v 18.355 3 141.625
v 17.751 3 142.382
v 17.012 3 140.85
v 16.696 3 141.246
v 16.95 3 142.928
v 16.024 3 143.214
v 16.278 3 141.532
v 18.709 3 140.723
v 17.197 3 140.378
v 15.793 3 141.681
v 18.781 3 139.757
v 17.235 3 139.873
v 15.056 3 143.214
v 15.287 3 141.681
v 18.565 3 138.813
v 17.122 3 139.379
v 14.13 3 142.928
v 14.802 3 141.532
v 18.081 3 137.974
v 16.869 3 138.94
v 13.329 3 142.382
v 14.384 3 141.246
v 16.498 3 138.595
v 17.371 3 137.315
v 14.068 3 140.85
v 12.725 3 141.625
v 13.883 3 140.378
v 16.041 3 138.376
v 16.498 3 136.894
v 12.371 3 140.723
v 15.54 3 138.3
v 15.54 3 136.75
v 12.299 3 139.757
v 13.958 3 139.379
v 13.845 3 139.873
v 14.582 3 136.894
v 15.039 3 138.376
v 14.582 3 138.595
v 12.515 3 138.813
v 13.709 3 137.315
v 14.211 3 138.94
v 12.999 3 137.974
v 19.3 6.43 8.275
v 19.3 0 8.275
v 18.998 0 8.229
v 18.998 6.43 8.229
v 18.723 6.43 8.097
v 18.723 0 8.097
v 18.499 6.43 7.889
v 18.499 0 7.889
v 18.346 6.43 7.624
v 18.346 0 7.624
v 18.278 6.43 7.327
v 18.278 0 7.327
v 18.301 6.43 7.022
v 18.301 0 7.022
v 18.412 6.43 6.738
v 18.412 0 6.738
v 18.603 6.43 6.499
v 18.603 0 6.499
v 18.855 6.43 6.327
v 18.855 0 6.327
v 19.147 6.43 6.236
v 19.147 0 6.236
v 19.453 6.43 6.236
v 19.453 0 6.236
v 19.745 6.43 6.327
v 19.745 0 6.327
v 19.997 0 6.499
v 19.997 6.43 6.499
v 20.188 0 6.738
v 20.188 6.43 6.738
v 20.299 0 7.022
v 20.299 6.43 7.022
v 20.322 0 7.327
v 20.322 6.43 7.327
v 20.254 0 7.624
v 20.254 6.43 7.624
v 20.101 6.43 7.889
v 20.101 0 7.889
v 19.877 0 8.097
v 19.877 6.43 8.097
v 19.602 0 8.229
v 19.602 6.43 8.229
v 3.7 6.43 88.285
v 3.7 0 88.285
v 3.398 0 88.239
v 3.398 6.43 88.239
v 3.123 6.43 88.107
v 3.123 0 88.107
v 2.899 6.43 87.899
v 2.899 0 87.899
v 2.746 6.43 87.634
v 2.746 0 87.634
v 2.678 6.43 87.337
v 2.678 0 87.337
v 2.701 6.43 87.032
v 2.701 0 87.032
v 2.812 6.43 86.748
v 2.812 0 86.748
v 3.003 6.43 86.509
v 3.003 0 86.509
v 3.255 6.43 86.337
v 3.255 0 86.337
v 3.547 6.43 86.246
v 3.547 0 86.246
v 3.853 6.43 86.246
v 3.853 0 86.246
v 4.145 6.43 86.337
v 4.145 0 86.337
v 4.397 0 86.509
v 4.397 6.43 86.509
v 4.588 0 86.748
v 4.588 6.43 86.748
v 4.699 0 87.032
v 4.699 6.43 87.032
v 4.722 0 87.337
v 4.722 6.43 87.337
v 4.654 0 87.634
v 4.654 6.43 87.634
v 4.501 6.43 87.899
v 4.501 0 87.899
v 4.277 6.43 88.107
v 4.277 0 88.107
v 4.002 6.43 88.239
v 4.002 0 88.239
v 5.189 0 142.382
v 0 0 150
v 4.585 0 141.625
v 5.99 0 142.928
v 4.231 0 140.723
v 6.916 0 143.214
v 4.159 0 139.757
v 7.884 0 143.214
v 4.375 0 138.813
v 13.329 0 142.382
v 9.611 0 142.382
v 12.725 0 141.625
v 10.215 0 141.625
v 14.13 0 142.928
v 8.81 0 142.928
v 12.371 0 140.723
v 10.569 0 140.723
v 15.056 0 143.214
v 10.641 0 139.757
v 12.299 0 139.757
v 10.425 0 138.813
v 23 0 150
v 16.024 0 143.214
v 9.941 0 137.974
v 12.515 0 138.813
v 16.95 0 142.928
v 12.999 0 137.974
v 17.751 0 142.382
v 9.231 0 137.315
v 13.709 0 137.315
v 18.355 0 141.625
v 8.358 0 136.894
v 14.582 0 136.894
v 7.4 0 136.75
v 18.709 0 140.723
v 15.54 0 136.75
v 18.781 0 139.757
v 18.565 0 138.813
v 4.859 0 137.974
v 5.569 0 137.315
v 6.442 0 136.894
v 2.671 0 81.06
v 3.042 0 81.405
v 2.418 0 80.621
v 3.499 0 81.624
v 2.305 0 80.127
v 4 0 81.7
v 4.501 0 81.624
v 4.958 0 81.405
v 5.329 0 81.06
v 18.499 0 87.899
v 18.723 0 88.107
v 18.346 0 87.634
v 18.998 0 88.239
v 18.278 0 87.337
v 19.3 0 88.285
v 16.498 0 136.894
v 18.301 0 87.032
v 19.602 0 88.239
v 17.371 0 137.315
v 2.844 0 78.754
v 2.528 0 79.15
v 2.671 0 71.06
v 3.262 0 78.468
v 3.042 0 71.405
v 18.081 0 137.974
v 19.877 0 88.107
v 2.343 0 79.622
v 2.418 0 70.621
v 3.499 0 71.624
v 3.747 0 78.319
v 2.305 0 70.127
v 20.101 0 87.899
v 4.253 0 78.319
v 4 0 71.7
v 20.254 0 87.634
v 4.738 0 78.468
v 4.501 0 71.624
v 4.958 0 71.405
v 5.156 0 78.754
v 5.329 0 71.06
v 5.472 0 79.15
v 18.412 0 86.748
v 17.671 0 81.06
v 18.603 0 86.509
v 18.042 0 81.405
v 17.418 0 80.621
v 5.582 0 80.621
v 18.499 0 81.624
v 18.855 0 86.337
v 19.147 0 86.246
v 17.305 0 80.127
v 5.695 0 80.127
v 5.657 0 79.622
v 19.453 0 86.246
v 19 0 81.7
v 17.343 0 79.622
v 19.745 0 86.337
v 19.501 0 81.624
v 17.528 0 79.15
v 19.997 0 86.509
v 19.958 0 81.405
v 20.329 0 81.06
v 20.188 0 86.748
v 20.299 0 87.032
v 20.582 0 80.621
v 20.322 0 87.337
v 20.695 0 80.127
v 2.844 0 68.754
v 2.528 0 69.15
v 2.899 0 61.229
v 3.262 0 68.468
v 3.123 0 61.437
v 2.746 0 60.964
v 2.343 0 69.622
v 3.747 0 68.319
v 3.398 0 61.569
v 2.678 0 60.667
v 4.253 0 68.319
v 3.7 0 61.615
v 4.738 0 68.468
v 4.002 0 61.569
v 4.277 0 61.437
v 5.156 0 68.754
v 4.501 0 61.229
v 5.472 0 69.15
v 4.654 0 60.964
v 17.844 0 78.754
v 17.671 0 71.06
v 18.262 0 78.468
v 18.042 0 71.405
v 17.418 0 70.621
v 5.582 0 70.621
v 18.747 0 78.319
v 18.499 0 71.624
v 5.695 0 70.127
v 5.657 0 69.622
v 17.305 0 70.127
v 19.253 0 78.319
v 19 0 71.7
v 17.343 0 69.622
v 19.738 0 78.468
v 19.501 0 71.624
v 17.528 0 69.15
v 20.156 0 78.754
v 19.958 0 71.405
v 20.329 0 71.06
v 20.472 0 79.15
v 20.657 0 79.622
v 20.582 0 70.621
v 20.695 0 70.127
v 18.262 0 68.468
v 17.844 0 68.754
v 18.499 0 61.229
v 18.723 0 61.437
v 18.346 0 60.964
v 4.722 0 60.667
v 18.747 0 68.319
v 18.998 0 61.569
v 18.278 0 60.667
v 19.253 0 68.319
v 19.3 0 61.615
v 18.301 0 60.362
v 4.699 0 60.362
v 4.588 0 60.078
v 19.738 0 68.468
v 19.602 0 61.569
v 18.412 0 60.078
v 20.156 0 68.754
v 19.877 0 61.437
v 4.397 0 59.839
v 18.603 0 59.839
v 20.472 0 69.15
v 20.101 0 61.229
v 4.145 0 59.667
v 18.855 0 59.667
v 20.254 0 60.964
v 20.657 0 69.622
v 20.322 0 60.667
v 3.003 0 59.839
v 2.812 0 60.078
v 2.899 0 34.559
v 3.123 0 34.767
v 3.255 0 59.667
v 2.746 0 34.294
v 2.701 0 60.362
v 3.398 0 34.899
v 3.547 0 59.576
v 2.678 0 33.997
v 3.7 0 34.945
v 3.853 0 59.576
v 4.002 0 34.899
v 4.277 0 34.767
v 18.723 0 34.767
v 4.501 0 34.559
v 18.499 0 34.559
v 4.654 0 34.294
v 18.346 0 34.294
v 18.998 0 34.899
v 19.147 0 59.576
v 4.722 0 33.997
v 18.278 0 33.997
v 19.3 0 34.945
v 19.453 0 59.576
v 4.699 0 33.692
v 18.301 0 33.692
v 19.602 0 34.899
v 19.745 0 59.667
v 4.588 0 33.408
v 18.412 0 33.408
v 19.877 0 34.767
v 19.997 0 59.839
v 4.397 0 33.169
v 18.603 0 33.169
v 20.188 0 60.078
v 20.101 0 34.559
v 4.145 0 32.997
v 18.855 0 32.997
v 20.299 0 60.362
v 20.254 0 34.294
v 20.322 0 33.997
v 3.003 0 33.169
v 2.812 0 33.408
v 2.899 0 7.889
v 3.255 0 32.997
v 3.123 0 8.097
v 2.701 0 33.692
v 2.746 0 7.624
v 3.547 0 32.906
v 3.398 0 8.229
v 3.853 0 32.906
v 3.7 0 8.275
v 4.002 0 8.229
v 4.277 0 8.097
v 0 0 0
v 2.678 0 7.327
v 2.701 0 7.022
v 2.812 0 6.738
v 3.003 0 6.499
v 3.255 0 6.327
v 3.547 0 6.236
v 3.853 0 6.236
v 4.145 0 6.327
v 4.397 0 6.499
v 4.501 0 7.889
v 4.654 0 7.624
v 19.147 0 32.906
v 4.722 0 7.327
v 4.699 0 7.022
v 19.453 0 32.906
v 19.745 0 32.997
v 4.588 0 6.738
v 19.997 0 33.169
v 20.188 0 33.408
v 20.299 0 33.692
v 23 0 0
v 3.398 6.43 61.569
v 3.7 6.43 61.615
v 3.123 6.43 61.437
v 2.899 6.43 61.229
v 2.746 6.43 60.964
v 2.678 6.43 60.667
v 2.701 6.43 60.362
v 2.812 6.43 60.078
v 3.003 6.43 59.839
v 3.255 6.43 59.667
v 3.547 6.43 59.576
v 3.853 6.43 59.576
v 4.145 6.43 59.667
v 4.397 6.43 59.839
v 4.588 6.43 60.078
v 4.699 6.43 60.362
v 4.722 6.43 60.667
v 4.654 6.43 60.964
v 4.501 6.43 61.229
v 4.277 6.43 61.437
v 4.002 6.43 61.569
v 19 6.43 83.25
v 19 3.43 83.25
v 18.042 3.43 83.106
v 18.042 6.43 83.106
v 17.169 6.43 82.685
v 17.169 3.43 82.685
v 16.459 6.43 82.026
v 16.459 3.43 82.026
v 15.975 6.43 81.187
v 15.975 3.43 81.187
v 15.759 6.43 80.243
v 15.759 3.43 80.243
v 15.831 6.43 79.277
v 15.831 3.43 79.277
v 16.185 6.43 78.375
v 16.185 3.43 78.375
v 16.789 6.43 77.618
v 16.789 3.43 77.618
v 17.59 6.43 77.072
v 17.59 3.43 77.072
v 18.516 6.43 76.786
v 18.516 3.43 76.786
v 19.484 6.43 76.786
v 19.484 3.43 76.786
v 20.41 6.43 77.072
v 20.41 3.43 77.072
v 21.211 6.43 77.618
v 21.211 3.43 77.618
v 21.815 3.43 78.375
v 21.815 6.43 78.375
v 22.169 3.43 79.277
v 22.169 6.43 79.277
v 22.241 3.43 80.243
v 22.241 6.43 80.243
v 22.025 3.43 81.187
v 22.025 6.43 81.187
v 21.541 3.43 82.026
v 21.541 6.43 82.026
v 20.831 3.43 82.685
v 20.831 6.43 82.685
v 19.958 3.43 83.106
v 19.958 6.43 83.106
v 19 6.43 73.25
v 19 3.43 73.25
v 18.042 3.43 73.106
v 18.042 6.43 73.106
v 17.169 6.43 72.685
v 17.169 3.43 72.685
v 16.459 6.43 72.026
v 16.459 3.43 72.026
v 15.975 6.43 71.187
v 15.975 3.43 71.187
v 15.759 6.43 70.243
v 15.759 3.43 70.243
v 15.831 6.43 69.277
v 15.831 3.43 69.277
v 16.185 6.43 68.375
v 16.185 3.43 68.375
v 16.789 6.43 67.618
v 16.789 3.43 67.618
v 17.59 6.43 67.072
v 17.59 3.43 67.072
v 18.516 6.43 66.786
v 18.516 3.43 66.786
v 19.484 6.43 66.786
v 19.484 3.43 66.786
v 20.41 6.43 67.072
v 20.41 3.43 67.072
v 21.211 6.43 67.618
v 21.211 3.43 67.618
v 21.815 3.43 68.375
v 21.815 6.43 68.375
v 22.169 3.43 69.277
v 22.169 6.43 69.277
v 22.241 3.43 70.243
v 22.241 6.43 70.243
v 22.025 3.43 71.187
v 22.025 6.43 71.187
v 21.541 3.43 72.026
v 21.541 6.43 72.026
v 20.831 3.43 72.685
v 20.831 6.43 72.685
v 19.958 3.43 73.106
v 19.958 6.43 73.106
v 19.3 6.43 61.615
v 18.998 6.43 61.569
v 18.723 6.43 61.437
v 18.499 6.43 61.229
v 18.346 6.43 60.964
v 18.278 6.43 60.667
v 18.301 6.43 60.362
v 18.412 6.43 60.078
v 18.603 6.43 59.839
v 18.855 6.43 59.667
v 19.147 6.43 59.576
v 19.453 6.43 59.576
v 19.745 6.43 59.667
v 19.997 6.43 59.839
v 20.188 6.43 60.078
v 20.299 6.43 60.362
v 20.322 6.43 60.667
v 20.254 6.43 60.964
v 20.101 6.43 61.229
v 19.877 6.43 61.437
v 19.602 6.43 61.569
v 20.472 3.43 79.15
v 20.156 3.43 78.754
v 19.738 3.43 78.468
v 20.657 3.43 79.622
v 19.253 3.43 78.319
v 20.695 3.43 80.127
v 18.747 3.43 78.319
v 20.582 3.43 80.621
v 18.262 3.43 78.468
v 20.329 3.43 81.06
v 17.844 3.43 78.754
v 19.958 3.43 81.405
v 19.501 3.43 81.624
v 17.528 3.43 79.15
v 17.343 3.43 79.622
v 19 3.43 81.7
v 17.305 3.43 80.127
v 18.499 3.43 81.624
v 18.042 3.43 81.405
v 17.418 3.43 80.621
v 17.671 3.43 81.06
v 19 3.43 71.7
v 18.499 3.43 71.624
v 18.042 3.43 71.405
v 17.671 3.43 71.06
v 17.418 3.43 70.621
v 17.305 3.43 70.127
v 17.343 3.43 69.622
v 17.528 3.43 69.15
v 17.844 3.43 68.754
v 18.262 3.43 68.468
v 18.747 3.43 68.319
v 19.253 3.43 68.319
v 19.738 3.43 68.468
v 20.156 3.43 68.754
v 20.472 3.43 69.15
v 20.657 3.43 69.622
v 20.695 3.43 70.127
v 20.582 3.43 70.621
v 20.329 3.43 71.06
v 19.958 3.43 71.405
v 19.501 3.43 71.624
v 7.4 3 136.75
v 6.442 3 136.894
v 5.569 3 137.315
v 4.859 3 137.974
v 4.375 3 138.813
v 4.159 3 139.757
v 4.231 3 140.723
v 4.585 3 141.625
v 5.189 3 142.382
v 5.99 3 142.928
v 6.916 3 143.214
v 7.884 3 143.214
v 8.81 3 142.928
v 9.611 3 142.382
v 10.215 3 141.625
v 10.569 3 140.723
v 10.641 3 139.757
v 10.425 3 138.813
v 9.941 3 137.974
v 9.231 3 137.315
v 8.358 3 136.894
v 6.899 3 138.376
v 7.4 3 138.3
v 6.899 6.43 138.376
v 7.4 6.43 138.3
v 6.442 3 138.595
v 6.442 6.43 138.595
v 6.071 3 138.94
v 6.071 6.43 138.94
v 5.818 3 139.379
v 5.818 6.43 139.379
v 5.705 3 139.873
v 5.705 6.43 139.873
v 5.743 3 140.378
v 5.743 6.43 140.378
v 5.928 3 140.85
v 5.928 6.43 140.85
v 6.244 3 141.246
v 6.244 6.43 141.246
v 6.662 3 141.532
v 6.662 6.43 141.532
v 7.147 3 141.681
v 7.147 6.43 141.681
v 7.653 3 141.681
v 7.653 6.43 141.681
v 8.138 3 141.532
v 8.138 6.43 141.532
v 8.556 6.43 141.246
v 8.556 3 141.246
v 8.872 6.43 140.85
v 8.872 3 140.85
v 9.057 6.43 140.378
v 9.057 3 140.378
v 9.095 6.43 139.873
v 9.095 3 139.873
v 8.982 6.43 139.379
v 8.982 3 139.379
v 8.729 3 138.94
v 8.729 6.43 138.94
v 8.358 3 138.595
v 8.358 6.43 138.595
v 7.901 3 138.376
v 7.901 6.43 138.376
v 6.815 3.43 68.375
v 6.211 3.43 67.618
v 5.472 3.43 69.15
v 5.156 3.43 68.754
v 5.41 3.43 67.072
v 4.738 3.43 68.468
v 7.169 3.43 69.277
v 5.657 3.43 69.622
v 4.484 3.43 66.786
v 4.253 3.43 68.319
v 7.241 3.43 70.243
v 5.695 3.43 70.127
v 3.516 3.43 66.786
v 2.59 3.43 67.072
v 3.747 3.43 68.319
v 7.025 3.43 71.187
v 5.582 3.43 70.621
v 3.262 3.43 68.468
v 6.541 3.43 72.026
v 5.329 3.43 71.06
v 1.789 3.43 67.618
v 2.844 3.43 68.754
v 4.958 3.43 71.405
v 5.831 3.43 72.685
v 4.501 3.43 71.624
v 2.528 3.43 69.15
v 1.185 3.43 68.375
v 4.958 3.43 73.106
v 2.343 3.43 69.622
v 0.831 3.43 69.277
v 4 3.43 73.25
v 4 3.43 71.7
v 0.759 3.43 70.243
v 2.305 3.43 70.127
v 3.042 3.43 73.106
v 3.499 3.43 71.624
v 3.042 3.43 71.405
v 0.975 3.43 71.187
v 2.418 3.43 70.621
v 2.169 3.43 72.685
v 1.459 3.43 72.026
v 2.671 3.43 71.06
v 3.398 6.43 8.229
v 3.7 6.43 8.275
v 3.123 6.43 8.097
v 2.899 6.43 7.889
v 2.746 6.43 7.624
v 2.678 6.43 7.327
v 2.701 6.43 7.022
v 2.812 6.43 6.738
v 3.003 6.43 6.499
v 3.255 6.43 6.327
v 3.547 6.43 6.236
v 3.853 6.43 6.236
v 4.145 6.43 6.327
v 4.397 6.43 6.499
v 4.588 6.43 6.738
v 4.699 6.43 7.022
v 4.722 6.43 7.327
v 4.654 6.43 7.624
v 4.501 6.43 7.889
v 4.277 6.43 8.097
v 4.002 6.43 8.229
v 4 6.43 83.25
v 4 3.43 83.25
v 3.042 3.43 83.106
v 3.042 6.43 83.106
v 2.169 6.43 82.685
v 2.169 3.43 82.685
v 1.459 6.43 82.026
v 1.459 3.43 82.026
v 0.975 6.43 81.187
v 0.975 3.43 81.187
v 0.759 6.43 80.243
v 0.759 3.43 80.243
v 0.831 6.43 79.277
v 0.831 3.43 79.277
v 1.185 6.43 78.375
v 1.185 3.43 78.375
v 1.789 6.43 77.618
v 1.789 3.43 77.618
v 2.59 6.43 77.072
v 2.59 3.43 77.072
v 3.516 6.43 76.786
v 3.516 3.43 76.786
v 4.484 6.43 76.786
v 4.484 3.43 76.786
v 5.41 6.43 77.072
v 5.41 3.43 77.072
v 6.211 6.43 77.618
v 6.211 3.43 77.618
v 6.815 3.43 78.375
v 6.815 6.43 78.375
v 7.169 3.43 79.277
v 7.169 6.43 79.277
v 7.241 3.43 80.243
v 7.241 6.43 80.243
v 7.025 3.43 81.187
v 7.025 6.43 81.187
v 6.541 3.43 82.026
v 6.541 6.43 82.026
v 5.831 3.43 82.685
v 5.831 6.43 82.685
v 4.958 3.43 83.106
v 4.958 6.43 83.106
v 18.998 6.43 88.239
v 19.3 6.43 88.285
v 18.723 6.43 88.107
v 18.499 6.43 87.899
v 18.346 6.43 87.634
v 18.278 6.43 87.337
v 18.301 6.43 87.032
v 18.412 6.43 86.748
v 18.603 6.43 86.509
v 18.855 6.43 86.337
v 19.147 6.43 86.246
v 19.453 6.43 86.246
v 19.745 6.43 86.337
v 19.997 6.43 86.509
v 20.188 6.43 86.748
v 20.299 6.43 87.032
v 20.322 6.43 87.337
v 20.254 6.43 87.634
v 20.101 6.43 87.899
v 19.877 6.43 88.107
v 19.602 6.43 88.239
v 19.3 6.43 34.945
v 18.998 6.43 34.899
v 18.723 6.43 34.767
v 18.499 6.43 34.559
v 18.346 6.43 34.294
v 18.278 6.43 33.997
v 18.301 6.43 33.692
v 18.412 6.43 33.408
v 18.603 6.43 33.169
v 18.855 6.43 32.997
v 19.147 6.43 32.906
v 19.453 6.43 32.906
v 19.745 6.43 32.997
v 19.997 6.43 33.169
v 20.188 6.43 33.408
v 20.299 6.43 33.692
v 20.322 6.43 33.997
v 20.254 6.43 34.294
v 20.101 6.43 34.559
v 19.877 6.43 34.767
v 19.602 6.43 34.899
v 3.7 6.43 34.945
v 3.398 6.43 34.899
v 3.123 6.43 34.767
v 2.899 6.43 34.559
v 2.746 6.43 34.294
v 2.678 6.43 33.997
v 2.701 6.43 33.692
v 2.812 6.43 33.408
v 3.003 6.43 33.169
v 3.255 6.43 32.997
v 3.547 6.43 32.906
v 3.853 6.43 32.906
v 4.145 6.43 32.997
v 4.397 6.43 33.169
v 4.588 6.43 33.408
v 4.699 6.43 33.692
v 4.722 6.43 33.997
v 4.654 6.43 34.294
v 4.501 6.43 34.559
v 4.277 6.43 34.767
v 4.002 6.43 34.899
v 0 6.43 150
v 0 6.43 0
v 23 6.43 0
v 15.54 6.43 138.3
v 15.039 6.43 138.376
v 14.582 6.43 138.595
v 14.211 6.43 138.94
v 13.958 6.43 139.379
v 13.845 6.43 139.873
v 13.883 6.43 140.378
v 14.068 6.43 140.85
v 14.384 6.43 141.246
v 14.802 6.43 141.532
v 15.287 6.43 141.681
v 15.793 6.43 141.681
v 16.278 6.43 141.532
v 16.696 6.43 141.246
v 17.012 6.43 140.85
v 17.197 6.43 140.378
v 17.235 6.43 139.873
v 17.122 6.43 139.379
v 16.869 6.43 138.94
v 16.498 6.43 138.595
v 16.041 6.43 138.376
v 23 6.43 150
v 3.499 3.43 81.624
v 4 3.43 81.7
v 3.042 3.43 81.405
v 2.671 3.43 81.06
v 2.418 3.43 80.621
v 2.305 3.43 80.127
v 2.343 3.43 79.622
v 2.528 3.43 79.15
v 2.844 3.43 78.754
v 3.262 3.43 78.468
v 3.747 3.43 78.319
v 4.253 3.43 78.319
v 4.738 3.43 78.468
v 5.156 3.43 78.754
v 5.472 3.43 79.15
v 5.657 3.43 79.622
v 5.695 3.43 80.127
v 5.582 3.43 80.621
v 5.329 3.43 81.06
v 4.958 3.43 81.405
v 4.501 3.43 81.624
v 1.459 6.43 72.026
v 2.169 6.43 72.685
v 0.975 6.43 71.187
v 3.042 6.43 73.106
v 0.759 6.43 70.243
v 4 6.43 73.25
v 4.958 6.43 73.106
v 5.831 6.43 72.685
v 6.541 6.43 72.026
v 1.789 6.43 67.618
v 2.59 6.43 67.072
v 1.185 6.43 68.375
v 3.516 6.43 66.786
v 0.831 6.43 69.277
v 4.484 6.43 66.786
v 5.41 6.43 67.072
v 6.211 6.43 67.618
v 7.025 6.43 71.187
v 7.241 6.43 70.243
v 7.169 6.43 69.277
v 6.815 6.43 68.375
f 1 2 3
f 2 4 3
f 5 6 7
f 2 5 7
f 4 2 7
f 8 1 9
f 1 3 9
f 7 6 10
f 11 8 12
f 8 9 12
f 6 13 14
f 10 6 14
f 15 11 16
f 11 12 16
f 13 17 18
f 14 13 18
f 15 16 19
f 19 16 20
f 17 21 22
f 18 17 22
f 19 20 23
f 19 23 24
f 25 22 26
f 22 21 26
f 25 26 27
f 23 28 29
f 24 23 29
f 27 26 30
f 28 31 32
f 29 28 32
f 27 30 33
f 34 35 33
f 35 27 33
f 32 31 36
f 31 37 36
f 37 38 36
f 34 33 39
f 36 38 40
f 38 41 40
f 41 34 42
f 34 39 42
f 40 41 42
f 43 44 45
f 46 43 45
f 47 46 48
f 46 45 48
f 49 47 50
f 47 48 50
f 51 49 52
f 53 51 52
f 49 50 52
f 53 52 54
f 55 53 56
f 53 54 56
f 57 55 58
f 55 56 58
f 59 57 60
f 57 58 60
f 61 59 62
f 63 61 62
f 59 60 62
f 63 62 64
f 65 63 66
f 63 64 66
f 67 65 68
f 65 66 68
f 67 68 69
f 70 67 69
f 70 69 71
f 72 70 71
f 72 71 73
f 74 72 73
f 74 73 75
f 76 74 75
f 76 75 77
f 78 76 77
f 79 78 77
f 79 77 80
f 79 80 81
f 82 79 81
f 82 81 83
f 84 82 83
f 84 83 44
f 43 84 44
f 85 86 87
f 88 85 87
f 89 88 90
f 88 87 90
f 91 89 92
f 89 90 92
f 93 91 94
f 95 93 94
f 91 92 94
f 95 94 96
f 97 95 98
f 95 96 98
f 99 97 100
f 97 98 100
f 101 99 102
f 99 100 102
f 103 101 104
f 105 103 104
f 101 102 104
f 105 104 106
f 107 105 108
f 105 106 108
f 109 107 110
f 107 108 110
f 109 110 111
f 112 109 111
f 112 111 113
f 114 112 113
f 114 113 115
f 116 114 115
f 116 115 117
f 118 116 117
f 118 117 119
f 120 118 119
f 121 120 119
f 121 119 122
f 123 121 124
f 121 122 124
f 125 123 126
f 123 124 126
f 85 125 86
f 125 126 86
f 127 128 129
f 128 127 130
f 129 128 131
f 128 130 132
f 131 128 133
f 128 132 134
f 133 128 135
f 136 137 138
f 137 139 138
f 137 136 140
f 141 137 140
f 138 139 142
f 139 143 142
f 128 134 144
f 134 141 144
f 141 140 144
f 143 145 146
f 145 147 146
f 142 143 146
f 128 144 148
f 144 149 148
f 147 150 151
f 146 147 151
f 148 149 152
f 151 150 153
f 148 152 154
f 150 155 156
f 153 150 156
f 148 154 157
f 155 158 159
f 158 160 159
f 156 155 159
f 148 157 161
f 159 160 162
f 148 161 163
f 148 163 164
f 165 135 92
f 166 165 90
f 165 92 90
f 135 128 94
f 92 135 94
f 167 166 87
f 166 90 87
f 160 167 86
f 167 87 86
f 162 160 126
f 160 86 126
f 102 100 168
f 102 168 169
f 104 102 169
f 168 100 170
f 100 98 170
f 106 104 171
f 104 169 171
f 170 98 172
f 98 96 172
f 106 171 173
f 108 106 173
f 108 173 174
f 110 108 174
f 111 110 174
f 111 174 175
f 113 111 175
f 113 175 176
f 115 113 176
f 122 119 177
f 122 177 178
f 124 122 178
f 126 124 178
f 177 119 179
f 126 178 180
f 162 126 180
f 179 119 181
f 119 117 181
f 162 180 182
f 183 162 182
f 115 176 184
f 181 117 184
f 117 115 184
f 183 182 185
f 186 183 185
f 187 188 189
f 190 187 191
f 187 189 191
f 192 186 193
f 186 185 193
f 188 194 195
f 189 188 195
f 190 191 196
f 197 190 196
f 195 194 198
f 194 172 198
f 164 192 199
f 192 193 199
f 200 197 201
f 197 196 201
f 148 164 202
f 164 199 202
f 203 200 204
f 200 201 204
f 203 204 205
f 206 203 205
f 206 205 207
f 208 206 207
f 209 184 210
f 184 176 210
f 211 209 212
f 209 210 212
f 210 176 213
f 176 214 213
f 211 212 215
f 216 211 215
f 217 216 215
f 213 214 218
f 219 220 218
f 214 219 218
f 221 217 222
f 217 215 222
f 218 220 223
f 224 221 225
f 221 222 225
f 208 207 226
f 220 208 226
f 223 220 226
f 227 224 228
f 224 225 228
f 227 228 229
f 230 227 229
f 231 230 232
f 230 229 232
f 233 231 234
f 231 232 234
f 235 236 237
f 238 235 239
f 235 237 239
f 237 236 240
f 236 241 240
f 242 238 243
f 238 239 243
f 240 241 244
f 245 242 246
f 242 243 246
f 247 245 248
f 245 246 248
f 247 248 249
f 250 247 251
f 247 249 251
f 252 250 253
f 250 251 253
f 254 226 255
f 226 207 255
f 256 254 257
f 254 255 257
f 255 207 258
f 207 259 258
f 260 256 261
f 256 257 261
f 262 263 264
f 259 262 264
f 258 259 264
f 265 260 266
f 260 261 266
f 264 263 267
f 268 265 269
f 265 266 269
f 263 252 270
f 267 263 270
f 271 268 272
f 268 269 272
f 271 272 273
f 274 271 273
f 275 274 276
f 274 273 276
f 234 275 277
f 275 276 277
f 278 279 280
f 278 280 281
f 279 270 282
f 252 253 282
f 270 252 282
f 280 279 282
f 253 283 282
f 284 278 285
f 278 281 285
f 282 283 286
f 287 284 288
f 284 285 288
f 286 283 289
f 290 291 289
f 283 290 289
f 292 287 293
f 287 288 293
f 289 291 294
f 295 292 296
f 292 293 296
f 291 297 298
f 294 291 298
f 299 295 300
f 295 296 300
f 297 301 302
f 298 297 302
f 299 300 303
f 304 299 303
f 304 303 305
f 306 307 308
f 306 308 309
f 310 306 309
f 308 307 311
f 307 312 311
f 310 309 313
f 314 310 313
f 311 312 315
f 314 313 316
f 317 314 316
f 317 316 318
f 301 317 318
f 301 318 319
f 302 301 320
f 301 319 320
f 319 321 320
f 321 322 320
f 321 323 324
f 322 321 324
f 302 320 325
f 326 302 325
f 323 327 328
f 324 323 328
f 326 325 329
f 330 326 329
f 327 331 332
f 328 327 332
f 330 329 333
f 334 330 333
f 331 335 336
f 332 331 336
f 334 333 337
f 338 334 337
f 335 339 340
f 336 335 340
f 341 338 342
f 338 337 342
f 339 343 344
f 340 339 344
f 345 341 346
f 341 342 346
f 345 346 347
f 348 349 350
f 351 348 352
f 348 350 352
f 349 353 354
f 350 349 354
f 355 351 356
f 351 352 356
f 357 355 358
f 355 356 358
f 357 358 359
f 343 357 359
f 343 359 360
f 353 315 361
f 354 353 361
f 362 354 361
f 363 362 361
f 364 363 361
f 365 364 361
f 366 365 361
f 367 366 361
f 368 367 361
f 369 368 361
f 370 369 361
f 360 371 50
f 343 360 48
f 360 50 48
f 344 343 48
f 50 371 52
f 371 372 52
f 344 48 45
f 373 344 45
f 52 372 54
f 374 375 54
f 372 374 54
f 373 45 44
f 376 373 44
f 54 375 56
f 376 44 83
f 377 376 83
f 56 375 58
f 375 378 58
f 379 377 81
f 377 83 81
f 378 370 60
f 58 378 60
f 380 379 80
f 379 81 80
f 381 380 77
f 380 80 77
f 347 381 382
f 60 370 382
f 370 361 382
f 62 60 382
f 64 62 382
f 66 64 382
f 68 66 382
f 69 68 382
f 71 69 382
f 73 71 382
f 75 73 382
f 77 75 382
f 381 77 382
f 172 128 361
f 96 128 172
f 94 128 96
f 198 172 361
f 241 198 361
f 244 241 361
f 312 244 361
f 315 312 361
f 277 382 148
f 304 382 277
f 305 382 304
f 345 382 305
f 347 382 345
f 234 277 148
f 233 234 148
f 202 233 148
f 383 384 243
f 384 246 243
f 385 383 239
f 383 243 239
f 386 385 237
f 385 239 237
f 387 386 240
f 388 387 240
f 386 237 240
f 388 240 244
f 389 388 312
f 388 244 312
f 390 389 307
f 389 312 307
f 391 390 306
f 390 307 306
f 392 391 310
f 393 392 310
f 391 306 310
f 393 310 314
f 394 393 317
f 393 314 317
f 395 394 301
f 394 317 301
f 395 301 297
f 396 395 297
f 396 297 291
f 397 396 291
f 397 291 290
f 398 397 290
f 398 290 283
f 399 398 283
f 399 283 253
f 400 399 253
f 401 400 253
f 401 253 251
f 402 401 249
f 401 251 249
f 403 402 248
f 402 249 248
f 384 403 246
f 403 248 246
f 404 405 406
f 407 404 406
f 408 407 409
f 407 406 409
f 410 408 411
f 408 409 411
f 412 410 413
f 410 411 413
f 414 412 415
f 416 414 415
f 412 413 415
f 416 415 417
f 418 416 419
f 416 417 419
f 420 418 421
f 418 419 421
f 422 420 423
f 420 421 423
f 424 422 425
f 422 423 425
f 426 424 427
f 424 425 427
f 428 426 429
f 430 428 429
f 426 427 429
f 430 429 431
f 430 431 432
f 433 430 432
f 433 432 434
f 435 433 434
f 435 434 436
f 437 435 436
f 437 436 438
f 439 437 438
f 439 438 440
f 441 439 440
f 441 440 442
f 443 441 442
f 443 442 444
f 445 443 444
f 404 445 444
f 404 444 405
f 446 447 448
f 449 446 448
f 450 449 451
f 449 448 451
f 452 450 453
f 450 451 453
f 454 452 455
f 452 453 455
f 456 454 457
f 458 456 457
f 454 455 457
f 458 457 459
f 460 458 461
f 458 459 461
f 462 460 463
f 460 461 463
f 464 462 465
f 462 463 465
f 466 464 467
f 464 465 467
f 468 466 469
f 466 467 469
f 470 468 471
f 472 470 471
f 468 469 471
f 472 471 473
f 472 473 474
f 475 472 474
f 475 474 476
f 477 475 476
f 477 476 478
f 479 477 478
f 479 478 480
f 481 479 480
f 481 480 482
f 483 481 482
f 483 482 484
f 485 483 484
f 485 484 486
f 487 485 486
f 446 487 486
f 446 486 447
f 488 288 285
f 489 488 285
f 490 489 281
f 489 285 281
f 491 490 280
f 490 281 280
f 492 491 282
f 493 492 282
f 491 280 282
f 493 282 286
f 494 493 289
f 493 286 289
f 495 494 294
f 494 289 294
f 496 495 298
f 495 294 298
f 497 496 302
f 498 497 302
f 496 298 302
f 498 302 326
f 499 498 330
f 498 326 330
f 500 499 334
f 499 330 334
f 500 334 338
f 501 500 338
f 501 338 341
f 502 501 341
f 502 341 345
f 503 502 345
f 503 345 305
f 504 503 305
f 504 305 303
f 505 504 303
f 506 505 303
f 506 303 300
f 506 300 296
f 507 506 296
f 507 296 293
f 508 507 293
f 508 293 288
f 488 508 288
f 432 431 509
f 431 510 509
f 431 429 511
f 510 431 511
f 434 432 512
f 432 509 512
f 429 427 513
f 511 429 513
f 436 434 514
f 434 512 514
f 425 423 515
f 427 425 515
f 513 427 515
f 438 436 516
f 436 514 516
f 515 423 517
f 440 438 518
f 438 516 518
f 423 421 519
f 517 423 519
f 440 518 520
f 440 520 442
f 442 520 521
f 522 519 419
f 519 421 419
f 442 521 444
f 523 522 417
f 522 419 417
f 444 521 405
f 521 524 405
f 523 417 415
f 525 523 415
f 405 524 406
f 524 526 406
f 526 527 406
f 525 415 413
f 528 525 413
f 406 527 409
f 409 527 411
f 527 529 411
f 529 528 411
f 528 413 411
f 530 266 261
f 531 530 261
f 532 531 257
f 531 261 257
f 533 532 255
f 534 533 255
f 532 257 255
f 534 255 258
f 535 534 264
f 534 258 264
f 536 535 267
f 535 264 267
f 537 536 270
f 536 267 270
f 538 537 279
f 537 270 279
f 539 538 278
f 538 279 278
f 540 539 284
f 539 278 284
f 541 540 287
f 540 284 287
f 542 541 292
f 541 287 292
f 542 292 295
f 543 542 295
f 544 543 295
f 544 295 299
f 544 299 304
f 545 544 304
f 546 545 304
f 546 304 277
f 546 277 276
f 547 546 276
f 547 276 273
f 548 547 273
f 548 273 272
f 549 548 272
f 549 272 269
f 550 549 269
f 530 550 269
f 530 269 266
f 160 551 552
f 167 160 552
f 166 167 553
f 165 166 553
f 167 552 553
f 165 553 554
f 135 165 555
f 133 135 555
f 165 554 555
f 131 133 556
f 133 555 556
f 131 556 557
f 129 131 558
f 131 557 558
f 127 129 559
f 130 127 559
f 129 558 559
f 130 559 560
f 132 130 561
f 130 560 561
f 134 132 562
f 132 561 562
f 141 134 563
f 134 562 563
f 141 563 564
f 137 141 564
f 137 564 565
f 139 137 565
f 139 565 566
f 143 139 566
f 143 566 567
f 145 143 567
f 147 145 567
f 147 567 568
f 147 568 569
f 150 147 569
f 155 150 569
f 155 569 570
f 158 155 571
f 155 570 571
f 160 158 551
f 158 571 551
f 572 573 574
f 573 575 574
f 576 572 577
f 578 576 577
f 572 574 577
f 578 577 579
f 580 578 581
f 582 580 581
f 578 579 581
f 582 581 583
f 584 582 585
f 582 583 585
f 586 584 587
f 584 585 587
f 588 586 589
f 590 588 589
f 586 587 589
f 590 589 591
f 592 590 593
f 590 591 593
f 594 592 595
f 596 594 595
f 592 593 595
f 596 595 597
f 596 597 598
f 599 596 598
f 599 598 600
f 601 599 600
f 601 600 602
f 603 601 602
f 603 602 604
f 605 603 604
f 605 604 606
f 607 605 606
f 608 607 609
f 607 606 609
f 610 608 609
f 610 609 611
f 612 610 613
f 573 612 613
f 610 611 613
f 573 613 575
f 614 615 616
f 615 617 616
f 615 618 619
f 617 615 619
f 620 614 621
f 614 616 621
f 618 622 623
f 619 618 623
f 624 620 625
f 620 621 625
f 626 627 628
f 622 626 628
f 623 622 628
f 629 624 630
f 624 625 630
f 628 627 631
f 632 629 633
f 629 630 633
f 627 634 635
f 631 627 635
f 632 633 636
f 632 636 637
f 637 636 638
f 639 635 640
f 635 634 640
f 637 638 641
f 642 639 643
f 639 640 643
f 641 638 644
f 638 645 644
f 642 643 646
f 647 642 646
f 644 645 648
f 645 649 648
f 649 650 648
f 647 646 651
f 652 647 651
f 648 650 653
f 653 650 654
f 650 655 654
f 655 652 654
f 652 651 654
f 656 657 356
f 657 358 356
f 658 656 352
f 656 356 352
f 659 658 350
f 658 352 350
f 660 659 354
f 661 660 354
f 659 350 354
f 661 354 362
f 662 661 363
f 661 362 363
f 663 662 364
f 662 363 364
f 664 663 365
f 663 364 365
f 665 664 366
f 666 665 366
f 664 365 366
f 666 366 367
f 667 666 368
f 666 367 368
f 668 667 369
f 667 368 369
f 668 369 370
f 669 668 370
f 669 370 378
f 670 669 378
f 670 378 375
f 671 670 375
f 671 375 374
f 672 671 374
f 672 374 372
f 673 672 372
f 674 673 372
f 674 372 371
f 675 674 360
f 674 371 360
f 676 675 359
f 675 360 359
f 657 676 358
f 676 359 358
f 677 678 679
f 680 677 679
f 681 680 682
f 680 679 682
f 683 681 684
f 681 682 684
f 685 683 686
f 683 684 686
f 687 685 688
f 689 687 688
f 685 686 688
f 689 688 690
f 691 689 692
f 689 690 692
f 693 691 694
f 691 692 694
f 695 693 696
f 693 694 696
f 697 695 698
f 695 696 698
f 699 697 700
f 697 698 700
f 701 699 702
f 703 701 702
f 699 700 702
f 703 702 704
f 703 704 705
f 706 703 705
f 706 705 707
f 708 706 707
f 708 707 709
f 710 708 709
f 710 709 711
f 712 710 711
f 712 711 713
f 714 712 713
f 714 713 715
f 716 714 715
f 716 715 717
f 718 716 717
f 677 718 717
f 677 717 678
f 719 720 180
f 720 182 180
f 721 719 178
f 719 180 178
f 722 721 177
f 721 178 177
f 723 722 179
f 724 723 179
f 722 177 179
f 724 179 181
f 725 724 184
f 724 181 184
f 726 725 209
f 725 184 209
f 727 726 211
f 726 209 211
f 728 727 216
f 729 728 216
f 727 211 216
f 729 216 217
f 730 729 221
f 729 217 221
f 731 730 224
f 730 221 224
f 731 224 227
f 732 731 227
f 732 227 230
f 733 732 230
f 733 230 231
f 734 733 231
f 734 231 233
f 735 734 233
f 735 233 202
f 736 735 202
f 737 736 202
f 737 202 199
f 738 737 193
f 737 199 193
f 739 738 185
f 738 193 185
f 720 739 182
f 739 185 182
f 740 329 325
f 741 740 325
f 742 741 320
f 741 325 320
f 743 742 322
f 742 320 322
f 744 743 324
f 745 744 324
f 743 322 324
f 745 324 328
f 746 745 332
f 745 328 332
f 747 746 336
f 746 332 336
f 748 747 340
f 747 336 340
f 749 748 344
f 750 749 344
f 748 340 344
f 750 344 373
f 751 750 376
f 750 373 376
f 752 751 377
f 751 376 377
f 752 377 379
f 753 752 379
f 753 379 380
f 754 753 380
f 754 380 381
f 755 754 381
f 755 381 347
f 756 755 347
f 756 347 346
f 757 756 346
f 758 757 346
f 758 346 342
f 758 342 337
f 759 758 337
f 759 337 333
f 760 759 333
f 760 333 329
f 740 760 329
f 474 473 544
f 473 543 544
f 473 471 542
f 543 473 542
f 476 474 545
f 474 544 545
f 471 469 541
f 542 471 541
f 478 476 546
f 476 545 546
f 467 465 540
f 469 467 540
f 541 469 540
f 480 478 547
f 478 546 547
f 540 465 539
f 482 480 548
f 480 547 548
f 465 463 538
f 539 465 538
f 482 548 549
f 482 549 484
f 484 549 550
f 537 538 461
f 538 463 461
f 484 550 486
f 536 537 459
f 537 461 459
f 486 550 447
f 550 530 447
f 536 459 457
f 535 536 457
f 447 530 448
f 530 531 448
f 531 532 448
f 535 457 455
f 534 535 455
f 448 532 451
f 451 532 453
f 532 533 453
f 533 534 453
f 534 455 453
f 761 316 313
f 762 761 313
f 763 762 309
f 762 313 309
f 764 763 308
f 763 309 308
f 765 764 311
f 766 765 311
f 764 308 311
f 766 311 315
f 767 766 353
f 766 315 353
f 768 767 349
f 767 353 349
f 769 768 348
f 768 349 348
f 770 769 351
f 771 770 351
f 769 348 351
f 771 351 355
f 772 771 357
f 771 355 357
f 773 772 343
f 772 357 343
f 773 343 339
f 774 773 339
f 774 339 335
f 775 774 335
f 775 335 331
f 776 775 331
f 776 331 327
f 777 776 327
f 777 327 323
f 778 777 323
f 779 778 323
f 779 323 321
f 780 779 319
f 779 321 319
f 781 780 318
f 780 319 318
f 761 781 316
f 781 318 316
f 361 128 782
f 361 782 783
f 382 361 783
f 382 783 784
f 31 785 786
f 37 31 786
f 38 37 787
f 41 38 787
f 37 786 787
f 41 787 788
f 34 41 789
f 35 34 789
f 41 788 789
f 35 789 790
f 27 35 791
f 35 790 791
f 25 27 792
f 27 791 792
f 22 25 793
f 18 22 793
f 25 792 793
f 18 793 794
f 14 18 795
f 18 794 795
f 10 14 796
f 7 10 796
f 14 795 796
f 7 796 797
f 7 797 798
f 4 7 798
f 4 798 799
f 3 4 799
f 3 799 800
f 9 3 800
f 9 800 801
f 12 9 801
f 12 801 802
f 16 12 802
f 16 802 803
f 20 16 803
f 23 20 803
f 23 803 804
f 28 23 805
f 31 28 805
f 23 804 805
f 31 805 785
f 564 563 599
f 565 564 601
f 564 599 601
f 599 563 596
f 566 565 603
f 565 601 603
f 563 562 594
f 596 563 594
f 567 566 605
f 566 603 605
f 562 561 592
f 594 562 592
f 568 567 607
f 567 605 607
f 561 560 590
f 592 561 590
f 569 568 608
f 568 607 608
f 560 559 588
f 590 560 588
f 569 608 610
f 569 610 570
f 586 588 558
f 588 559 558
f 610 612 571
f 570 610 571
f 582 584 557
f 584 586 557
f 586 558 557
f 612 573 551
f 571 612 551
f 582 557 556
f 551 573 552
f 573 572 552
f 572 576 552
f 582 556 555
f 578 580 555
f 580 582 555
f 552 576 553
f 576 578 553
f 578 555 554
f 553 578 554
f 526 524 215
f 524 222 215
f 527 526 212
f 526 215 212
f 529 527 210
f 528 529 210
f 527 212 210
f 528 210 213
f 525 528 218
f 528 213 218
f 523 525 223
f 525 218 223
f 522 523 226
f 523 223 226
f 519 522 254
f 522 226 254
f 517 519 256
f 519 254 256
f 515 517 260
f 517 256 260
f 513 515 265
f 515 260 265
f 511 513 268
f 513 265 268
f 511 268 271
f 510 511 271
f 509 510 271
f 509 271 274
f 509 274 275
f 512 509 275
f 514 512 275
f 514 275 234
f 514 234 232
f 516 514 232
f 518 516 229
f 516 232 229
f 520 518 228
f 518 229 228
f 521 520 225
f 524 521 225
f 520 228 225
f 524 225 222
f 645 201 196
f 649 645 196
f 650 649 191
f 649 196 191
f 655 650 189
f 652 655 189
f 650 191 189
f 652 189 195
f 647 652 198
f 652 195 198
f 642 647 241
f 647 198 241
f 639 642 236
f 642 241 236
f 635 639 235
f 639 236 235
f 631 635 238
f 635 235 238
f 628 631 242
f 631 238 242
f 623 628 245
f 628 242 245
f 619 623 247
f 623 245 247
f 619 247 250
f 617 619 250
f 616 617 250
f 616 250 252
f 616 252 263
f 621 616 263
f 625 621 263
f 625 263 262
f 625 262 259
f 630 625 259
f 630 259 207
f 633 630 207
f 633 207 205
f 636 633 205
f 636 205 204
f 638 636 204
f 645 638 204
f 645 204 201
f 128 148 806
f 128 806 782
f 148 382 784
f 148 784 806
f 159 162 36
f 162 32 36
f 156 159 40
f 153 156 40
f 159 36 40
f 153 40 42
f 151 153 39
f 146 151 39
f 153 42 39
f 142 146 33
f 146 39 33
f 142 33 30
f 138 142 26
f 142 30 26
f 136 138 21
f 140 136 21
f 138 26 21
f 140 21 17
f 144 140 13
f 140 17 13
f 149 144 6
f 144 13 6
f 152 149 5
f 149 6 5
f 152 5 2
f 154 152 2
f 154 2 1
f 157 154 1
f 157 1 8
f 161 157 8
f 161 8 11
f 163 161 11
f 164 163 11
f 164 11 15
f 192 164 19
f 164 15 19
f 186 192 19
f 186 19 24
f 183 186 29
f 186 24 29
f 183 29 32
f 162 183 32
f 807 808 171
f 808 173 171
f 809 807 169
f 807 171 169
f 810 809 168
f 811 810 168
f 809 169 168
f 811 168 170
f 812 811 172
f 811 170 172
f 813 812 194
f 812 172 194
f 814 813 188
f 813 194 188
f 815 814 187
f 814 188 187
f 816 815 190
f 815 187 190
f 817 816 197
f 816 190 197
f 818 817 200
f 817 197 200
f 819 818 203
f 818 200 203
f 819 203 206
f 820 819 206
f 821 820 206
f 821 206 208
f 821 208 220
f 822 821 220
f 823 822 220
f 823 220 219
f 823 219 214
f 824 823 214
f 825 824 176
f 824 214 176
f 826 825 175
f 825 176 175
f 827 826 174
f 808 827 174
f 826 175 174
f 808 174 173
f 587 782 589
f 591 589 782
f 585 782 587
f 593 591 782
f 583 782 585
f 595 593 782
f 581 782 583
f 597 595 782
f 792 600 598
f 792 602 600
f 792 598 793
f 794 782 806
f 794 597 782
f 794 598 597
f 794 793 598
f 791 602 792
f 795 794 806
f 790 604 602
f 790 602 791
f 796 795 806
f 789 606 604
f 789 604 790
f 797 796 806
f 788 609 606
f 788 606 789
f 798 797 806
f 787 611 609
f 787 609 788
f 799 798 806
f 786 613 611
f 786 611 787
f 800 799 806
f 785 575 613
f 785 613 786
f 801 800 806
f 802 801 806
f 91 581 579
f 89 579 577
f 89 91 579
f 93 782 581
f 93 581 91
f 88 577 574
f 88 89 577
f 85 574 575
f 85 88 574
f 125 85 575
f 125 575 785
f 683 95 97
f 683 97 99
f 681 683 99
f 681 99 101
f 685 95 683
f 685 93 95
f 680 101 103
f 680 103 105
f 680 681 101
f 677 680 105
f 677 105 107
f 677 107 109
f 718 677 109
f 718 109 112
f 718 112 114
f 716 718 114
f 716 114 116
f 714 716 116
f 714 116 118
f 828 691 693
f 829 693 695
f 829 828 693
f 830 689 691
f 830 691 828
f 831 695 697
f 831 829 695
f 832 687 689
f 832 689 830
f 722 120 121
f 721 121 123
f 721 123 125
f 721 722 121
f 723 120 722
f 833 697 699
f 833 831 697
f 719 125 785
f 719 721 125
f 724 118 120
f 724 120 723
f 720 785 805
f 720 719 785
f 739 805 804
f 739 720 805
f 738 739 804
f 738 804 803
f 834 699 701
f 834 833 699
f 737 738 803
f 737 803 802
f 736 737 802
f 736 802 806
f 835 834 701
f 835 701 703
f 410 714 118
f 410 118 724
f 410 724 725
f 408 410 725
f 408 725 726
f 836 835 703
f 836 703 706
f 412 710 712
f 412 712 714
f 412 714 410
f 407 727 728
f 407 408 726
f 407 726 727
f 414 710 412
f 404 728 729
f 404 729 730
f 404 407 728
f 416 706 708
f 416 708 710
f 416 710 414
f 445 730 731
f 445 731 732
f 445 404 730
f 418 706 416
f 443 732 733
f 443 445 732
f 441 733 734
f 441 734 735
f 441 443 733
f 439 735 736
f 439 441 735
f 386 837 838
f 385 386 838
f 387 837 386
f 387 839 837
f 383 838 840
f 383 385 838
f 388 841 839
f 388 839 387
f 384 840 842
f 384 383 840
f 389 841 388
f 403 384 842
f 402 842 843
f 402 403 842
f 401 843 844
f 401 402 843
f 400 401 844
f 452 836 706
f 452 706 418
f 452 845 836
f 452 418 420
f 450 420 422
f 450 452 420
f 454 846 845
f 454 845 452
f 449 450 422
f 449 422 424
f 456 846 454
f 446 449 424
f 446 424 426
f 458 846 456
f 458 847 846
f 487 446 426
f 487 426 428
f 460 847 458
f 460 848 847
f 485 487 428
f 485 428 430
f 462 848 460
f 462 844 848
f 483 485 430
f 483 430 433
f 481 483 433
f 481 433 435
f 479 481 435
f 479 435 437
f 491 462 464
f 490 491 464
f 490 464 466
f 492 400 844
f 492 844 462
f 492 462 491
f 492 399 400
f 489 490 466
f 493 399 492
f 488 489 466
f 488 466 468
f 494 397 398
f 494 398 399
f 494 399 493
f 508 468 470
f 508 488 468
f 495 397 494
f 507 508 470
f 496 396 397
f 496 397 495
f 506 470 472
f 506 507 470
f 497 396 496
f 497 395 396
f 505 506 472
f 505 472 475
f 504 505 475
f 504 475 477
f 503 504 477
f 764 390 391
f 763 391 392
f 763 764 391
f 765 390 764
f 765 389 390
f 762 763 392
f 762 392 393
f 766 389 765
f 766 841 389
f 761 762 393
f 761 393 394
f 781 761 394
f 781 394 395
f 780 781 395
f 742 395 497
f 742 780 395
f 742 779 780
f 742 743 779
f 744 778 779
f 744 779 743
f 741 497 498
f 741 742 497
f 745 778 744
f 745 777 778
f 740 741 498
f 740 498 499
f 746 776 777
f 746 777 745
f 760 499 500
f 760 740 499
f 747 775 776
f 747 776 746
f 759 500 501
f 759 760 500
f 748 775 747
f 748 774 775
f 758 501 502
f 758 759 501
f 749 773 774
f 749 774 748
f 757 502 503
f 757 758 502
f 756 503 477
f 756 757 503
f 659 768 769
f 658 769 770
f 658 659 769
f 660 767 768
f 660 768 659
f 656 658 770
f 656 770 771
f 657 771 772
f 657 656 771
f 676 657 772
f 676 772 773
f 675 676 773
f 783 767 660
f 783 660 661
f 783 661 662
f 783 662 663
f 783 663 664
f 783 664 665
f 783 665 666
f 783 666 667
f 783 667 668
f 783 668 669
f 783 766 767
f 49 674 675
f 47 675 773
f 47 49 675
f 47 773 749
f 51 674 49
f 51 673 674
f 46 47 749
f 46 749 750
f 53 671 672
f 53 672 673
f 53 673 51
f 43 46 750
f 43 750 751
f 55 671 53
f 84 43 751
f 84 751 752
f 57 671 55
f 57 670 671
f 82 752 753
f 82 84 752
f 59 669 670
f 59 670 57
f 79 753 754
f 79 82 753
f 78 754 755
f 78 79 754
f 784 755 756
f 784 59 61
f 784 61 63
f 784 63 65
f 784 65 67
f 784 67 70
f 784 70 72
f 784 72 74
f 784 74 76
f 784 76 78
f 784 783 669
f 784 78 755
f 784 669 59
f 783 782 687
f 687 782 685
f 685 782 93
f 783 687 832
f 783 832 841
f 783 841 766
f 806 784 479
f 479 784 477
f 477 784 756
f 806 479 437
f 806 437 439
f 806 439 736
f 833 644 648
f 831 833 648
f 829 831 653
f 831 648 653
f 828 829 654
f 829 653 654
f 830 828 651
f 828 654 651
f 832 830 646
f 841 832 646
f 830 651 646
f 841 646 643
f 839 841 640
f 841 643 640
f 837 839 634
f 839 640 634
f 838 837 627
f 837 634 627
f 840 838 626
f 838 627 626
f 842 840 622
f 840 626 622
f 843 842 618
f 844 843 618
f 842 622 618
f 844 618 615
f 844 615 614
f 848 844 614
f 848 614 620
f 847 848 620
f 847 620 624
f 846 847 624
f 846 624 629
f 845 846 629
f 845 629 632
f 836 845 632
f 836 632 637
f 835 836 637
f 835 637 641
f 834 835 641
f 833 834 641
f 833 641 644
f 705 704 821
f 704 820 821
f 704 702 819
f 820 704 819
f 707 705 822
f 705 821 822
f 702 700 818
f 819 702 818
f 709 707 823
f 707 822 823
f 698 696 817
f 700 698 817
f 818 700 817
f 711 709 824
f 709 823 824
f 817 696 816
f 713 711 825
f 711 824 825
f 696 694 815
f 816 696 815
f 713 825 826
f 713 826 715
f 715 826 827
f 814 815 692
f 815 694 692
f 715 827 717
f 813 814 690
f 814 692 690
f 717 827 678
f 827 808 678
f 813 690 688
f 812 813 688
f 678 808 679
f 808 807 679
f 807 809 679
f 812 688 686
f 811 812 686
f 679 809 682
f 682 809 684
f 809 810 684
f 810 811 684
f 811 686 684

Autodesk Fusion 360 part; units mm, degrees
sketch "Sketch1" plane through (0, 0, 0) normal (0, 1, 0) x (1, 0, 0)
  line L0 (0, 0) -> (23, 0)
  line L1 (23, 0) -> (23, -150)
  line L2 (23, -150) -> (0, -150)
  line L3 (0, -150) -> (0, 0)
  dimension "d1" = 23
  dimension "d2" = 150
extrude "Extrude1" add sketch "Sketch1" along normal blind 6.43
sketch "Sketch2" plane through (0, 6.43, 0) normal (0, 1, 0) x (1, 0, 0)
  line L0 (11.5, 0) -> (11.5, -150) construction
  line L1 (0, 0) -> (0, -150)
  line L2 (0, -75) -> (23, -75) construction
  line L3 (19, -70) -> (4, -70) construction
  line L4 (4, -70) -> (4, -80) construction
  line L5 (4, -80) -> (19, -80) construction
  line L6 (19, -80) -> (19, -70) construction
  line L7 (19, -70) -> (4, -80) construction
  line L8 (4, -70) -> (19, -80) construction
  line L9 (23, 0) -> (0, 0)
  line L10 (0, -150) -> (23, -150)
  line L11 (0, -150) -> (23, -150)
  line L12 (23, -150) -> (23, 0)
  line L13 (23, 0) -> (0, 0)
  line L14 (0, 0) -> (0, -150)
  point P0 (11.5, -75)
  point P1 (4, -70)
  point P2 (19, -70)
  point P3 (19, -80)
  point P4 (4, -80)
  point P5 (3.7, -7.25)
  point P6 (19.3, -7.25)
  point P7 (3.7, -33.92)
  point P8 (3.7, -60.59)
  point P9 (3.7, -87.26)
  point P10 (19.3, -33.92)
  point P11 (19.3, -60.59)
  point P12 (19.3, -87.26)
  dimension "d5" = 11.5
  dimension "d6" = 15
  dimension "d7" = 10
  dimension "d8" = 15.6
  dimension "d9" = 19.3
  dimension "d10" = 7.25
  dimension "d13" = 0
  dimension "d14" = -26.67
  dimension "d17" = 0
  dimension "d18" = -26.67
hole "Hole1" at (4, 6.43, 70) direction (0, -1, 0) diameter 3.4 end through all counterbore diameter 6.5 counterbore depth 3
hole "Hole2" at (19, 6.43, 70) direction (0, -1, 0) diameter 3.4 end through all counterbore diameter 6.5 counterbore depth 3
hole "Hole3" at (4, 6.43, 80) direction (0, -1, 0) diameter 3.4 end through all counterbore diameter 6.5 counterbore depth 3
hole "Hole4" at (19, 6.43, 80) direction (0, -1, 0) diameter 3.4 end through all counterbore diameter 6.5 counterbore depth 3
hole "Hole5" at (3.7, 6.43, 7.25) direction (0, -1, 0) diameter 2.05 end through all
hole "Hole6" at (19.3, 6.43, 7.25) direction (0, -1, 0) diameter 2.05 end through all
hole "Hole7" at (3.7, 6.43, 33.92) direction (0, -1, 0) diameter 2.05 end through all
hole "Hole8" at (19.3, 6.43, 33.92) direction (0, -1, 0) diameter 2.05 end through all
hole "Hole9" at (3.7, 6.43, 60.59) direction (0, -1, 0) diameter 2.05 end through all
hole "Hole10" at (19.3, 6.43, 60.59) direction (0, -1, 0) diameter 2.05 end through all
hole "Hole11" at (3.7, 6.43, 87.26) direction (0, -1, 0) diameter 2.05 end through all
hole "Hole12" at (19.3, 6.43, 87.26) direction (0, -1, 0) diameter 2.05 end through all
sketch "Sketch3" plane through (0, 0, 0) normal (0, -1, 0) x (1, 0, 0)
  circle A0 centre (19.3, 87.26) radius 1.025
  circle A1 centre (3.7, 87.26) radius 1.025
  circle A2 centre (19.3, 60.59) radius 1.025
  circle A3 centre (3.7, 60.59) radius 1.025
  circle A4 centre (19.3, 33.92) radius 1.025
  circle A5 centre (3.7, 33.92) radius 1.025
  circle A6 centre (19.3, 7.25) radius 1.025
  circle A7 centre (3.7, 7.25) radius 1.025
  circle A8 centre (19, 80) radius 1.7
  circle A9 centre (4, 80) radius 1.7
  circle A10 centre (19, 70) radius 1.7
  circle A11 centre (4, 70) radius 1.7
  line L0 (23, 150) -> (0, 150)
  line L1 (0, 150) -> (0, 0)
  line L2 (0, 0) -> (23, 0)
  line L3 (23, 0) -> (23, 150)
  line L4 (0, 150) -> (23, 150)
  point P0 (15.6, 140)
  point P1 (7.46, 140)
  dimension "d92" = 8.14
  dimension "d93" = 10
  dimension "d94" = 7.4
hole "Hole17" at (7.4, 0, 140) direction (0, 1, 0) diameter 3.4 end through all counterbore diameter 6.5 counterbore depth 3
hole "Hole18" at (15.54, 0, 140) direction (0, 1, 0) diameter 3.4 end through all counterbore diameter 6.5 counterbore depth 3
